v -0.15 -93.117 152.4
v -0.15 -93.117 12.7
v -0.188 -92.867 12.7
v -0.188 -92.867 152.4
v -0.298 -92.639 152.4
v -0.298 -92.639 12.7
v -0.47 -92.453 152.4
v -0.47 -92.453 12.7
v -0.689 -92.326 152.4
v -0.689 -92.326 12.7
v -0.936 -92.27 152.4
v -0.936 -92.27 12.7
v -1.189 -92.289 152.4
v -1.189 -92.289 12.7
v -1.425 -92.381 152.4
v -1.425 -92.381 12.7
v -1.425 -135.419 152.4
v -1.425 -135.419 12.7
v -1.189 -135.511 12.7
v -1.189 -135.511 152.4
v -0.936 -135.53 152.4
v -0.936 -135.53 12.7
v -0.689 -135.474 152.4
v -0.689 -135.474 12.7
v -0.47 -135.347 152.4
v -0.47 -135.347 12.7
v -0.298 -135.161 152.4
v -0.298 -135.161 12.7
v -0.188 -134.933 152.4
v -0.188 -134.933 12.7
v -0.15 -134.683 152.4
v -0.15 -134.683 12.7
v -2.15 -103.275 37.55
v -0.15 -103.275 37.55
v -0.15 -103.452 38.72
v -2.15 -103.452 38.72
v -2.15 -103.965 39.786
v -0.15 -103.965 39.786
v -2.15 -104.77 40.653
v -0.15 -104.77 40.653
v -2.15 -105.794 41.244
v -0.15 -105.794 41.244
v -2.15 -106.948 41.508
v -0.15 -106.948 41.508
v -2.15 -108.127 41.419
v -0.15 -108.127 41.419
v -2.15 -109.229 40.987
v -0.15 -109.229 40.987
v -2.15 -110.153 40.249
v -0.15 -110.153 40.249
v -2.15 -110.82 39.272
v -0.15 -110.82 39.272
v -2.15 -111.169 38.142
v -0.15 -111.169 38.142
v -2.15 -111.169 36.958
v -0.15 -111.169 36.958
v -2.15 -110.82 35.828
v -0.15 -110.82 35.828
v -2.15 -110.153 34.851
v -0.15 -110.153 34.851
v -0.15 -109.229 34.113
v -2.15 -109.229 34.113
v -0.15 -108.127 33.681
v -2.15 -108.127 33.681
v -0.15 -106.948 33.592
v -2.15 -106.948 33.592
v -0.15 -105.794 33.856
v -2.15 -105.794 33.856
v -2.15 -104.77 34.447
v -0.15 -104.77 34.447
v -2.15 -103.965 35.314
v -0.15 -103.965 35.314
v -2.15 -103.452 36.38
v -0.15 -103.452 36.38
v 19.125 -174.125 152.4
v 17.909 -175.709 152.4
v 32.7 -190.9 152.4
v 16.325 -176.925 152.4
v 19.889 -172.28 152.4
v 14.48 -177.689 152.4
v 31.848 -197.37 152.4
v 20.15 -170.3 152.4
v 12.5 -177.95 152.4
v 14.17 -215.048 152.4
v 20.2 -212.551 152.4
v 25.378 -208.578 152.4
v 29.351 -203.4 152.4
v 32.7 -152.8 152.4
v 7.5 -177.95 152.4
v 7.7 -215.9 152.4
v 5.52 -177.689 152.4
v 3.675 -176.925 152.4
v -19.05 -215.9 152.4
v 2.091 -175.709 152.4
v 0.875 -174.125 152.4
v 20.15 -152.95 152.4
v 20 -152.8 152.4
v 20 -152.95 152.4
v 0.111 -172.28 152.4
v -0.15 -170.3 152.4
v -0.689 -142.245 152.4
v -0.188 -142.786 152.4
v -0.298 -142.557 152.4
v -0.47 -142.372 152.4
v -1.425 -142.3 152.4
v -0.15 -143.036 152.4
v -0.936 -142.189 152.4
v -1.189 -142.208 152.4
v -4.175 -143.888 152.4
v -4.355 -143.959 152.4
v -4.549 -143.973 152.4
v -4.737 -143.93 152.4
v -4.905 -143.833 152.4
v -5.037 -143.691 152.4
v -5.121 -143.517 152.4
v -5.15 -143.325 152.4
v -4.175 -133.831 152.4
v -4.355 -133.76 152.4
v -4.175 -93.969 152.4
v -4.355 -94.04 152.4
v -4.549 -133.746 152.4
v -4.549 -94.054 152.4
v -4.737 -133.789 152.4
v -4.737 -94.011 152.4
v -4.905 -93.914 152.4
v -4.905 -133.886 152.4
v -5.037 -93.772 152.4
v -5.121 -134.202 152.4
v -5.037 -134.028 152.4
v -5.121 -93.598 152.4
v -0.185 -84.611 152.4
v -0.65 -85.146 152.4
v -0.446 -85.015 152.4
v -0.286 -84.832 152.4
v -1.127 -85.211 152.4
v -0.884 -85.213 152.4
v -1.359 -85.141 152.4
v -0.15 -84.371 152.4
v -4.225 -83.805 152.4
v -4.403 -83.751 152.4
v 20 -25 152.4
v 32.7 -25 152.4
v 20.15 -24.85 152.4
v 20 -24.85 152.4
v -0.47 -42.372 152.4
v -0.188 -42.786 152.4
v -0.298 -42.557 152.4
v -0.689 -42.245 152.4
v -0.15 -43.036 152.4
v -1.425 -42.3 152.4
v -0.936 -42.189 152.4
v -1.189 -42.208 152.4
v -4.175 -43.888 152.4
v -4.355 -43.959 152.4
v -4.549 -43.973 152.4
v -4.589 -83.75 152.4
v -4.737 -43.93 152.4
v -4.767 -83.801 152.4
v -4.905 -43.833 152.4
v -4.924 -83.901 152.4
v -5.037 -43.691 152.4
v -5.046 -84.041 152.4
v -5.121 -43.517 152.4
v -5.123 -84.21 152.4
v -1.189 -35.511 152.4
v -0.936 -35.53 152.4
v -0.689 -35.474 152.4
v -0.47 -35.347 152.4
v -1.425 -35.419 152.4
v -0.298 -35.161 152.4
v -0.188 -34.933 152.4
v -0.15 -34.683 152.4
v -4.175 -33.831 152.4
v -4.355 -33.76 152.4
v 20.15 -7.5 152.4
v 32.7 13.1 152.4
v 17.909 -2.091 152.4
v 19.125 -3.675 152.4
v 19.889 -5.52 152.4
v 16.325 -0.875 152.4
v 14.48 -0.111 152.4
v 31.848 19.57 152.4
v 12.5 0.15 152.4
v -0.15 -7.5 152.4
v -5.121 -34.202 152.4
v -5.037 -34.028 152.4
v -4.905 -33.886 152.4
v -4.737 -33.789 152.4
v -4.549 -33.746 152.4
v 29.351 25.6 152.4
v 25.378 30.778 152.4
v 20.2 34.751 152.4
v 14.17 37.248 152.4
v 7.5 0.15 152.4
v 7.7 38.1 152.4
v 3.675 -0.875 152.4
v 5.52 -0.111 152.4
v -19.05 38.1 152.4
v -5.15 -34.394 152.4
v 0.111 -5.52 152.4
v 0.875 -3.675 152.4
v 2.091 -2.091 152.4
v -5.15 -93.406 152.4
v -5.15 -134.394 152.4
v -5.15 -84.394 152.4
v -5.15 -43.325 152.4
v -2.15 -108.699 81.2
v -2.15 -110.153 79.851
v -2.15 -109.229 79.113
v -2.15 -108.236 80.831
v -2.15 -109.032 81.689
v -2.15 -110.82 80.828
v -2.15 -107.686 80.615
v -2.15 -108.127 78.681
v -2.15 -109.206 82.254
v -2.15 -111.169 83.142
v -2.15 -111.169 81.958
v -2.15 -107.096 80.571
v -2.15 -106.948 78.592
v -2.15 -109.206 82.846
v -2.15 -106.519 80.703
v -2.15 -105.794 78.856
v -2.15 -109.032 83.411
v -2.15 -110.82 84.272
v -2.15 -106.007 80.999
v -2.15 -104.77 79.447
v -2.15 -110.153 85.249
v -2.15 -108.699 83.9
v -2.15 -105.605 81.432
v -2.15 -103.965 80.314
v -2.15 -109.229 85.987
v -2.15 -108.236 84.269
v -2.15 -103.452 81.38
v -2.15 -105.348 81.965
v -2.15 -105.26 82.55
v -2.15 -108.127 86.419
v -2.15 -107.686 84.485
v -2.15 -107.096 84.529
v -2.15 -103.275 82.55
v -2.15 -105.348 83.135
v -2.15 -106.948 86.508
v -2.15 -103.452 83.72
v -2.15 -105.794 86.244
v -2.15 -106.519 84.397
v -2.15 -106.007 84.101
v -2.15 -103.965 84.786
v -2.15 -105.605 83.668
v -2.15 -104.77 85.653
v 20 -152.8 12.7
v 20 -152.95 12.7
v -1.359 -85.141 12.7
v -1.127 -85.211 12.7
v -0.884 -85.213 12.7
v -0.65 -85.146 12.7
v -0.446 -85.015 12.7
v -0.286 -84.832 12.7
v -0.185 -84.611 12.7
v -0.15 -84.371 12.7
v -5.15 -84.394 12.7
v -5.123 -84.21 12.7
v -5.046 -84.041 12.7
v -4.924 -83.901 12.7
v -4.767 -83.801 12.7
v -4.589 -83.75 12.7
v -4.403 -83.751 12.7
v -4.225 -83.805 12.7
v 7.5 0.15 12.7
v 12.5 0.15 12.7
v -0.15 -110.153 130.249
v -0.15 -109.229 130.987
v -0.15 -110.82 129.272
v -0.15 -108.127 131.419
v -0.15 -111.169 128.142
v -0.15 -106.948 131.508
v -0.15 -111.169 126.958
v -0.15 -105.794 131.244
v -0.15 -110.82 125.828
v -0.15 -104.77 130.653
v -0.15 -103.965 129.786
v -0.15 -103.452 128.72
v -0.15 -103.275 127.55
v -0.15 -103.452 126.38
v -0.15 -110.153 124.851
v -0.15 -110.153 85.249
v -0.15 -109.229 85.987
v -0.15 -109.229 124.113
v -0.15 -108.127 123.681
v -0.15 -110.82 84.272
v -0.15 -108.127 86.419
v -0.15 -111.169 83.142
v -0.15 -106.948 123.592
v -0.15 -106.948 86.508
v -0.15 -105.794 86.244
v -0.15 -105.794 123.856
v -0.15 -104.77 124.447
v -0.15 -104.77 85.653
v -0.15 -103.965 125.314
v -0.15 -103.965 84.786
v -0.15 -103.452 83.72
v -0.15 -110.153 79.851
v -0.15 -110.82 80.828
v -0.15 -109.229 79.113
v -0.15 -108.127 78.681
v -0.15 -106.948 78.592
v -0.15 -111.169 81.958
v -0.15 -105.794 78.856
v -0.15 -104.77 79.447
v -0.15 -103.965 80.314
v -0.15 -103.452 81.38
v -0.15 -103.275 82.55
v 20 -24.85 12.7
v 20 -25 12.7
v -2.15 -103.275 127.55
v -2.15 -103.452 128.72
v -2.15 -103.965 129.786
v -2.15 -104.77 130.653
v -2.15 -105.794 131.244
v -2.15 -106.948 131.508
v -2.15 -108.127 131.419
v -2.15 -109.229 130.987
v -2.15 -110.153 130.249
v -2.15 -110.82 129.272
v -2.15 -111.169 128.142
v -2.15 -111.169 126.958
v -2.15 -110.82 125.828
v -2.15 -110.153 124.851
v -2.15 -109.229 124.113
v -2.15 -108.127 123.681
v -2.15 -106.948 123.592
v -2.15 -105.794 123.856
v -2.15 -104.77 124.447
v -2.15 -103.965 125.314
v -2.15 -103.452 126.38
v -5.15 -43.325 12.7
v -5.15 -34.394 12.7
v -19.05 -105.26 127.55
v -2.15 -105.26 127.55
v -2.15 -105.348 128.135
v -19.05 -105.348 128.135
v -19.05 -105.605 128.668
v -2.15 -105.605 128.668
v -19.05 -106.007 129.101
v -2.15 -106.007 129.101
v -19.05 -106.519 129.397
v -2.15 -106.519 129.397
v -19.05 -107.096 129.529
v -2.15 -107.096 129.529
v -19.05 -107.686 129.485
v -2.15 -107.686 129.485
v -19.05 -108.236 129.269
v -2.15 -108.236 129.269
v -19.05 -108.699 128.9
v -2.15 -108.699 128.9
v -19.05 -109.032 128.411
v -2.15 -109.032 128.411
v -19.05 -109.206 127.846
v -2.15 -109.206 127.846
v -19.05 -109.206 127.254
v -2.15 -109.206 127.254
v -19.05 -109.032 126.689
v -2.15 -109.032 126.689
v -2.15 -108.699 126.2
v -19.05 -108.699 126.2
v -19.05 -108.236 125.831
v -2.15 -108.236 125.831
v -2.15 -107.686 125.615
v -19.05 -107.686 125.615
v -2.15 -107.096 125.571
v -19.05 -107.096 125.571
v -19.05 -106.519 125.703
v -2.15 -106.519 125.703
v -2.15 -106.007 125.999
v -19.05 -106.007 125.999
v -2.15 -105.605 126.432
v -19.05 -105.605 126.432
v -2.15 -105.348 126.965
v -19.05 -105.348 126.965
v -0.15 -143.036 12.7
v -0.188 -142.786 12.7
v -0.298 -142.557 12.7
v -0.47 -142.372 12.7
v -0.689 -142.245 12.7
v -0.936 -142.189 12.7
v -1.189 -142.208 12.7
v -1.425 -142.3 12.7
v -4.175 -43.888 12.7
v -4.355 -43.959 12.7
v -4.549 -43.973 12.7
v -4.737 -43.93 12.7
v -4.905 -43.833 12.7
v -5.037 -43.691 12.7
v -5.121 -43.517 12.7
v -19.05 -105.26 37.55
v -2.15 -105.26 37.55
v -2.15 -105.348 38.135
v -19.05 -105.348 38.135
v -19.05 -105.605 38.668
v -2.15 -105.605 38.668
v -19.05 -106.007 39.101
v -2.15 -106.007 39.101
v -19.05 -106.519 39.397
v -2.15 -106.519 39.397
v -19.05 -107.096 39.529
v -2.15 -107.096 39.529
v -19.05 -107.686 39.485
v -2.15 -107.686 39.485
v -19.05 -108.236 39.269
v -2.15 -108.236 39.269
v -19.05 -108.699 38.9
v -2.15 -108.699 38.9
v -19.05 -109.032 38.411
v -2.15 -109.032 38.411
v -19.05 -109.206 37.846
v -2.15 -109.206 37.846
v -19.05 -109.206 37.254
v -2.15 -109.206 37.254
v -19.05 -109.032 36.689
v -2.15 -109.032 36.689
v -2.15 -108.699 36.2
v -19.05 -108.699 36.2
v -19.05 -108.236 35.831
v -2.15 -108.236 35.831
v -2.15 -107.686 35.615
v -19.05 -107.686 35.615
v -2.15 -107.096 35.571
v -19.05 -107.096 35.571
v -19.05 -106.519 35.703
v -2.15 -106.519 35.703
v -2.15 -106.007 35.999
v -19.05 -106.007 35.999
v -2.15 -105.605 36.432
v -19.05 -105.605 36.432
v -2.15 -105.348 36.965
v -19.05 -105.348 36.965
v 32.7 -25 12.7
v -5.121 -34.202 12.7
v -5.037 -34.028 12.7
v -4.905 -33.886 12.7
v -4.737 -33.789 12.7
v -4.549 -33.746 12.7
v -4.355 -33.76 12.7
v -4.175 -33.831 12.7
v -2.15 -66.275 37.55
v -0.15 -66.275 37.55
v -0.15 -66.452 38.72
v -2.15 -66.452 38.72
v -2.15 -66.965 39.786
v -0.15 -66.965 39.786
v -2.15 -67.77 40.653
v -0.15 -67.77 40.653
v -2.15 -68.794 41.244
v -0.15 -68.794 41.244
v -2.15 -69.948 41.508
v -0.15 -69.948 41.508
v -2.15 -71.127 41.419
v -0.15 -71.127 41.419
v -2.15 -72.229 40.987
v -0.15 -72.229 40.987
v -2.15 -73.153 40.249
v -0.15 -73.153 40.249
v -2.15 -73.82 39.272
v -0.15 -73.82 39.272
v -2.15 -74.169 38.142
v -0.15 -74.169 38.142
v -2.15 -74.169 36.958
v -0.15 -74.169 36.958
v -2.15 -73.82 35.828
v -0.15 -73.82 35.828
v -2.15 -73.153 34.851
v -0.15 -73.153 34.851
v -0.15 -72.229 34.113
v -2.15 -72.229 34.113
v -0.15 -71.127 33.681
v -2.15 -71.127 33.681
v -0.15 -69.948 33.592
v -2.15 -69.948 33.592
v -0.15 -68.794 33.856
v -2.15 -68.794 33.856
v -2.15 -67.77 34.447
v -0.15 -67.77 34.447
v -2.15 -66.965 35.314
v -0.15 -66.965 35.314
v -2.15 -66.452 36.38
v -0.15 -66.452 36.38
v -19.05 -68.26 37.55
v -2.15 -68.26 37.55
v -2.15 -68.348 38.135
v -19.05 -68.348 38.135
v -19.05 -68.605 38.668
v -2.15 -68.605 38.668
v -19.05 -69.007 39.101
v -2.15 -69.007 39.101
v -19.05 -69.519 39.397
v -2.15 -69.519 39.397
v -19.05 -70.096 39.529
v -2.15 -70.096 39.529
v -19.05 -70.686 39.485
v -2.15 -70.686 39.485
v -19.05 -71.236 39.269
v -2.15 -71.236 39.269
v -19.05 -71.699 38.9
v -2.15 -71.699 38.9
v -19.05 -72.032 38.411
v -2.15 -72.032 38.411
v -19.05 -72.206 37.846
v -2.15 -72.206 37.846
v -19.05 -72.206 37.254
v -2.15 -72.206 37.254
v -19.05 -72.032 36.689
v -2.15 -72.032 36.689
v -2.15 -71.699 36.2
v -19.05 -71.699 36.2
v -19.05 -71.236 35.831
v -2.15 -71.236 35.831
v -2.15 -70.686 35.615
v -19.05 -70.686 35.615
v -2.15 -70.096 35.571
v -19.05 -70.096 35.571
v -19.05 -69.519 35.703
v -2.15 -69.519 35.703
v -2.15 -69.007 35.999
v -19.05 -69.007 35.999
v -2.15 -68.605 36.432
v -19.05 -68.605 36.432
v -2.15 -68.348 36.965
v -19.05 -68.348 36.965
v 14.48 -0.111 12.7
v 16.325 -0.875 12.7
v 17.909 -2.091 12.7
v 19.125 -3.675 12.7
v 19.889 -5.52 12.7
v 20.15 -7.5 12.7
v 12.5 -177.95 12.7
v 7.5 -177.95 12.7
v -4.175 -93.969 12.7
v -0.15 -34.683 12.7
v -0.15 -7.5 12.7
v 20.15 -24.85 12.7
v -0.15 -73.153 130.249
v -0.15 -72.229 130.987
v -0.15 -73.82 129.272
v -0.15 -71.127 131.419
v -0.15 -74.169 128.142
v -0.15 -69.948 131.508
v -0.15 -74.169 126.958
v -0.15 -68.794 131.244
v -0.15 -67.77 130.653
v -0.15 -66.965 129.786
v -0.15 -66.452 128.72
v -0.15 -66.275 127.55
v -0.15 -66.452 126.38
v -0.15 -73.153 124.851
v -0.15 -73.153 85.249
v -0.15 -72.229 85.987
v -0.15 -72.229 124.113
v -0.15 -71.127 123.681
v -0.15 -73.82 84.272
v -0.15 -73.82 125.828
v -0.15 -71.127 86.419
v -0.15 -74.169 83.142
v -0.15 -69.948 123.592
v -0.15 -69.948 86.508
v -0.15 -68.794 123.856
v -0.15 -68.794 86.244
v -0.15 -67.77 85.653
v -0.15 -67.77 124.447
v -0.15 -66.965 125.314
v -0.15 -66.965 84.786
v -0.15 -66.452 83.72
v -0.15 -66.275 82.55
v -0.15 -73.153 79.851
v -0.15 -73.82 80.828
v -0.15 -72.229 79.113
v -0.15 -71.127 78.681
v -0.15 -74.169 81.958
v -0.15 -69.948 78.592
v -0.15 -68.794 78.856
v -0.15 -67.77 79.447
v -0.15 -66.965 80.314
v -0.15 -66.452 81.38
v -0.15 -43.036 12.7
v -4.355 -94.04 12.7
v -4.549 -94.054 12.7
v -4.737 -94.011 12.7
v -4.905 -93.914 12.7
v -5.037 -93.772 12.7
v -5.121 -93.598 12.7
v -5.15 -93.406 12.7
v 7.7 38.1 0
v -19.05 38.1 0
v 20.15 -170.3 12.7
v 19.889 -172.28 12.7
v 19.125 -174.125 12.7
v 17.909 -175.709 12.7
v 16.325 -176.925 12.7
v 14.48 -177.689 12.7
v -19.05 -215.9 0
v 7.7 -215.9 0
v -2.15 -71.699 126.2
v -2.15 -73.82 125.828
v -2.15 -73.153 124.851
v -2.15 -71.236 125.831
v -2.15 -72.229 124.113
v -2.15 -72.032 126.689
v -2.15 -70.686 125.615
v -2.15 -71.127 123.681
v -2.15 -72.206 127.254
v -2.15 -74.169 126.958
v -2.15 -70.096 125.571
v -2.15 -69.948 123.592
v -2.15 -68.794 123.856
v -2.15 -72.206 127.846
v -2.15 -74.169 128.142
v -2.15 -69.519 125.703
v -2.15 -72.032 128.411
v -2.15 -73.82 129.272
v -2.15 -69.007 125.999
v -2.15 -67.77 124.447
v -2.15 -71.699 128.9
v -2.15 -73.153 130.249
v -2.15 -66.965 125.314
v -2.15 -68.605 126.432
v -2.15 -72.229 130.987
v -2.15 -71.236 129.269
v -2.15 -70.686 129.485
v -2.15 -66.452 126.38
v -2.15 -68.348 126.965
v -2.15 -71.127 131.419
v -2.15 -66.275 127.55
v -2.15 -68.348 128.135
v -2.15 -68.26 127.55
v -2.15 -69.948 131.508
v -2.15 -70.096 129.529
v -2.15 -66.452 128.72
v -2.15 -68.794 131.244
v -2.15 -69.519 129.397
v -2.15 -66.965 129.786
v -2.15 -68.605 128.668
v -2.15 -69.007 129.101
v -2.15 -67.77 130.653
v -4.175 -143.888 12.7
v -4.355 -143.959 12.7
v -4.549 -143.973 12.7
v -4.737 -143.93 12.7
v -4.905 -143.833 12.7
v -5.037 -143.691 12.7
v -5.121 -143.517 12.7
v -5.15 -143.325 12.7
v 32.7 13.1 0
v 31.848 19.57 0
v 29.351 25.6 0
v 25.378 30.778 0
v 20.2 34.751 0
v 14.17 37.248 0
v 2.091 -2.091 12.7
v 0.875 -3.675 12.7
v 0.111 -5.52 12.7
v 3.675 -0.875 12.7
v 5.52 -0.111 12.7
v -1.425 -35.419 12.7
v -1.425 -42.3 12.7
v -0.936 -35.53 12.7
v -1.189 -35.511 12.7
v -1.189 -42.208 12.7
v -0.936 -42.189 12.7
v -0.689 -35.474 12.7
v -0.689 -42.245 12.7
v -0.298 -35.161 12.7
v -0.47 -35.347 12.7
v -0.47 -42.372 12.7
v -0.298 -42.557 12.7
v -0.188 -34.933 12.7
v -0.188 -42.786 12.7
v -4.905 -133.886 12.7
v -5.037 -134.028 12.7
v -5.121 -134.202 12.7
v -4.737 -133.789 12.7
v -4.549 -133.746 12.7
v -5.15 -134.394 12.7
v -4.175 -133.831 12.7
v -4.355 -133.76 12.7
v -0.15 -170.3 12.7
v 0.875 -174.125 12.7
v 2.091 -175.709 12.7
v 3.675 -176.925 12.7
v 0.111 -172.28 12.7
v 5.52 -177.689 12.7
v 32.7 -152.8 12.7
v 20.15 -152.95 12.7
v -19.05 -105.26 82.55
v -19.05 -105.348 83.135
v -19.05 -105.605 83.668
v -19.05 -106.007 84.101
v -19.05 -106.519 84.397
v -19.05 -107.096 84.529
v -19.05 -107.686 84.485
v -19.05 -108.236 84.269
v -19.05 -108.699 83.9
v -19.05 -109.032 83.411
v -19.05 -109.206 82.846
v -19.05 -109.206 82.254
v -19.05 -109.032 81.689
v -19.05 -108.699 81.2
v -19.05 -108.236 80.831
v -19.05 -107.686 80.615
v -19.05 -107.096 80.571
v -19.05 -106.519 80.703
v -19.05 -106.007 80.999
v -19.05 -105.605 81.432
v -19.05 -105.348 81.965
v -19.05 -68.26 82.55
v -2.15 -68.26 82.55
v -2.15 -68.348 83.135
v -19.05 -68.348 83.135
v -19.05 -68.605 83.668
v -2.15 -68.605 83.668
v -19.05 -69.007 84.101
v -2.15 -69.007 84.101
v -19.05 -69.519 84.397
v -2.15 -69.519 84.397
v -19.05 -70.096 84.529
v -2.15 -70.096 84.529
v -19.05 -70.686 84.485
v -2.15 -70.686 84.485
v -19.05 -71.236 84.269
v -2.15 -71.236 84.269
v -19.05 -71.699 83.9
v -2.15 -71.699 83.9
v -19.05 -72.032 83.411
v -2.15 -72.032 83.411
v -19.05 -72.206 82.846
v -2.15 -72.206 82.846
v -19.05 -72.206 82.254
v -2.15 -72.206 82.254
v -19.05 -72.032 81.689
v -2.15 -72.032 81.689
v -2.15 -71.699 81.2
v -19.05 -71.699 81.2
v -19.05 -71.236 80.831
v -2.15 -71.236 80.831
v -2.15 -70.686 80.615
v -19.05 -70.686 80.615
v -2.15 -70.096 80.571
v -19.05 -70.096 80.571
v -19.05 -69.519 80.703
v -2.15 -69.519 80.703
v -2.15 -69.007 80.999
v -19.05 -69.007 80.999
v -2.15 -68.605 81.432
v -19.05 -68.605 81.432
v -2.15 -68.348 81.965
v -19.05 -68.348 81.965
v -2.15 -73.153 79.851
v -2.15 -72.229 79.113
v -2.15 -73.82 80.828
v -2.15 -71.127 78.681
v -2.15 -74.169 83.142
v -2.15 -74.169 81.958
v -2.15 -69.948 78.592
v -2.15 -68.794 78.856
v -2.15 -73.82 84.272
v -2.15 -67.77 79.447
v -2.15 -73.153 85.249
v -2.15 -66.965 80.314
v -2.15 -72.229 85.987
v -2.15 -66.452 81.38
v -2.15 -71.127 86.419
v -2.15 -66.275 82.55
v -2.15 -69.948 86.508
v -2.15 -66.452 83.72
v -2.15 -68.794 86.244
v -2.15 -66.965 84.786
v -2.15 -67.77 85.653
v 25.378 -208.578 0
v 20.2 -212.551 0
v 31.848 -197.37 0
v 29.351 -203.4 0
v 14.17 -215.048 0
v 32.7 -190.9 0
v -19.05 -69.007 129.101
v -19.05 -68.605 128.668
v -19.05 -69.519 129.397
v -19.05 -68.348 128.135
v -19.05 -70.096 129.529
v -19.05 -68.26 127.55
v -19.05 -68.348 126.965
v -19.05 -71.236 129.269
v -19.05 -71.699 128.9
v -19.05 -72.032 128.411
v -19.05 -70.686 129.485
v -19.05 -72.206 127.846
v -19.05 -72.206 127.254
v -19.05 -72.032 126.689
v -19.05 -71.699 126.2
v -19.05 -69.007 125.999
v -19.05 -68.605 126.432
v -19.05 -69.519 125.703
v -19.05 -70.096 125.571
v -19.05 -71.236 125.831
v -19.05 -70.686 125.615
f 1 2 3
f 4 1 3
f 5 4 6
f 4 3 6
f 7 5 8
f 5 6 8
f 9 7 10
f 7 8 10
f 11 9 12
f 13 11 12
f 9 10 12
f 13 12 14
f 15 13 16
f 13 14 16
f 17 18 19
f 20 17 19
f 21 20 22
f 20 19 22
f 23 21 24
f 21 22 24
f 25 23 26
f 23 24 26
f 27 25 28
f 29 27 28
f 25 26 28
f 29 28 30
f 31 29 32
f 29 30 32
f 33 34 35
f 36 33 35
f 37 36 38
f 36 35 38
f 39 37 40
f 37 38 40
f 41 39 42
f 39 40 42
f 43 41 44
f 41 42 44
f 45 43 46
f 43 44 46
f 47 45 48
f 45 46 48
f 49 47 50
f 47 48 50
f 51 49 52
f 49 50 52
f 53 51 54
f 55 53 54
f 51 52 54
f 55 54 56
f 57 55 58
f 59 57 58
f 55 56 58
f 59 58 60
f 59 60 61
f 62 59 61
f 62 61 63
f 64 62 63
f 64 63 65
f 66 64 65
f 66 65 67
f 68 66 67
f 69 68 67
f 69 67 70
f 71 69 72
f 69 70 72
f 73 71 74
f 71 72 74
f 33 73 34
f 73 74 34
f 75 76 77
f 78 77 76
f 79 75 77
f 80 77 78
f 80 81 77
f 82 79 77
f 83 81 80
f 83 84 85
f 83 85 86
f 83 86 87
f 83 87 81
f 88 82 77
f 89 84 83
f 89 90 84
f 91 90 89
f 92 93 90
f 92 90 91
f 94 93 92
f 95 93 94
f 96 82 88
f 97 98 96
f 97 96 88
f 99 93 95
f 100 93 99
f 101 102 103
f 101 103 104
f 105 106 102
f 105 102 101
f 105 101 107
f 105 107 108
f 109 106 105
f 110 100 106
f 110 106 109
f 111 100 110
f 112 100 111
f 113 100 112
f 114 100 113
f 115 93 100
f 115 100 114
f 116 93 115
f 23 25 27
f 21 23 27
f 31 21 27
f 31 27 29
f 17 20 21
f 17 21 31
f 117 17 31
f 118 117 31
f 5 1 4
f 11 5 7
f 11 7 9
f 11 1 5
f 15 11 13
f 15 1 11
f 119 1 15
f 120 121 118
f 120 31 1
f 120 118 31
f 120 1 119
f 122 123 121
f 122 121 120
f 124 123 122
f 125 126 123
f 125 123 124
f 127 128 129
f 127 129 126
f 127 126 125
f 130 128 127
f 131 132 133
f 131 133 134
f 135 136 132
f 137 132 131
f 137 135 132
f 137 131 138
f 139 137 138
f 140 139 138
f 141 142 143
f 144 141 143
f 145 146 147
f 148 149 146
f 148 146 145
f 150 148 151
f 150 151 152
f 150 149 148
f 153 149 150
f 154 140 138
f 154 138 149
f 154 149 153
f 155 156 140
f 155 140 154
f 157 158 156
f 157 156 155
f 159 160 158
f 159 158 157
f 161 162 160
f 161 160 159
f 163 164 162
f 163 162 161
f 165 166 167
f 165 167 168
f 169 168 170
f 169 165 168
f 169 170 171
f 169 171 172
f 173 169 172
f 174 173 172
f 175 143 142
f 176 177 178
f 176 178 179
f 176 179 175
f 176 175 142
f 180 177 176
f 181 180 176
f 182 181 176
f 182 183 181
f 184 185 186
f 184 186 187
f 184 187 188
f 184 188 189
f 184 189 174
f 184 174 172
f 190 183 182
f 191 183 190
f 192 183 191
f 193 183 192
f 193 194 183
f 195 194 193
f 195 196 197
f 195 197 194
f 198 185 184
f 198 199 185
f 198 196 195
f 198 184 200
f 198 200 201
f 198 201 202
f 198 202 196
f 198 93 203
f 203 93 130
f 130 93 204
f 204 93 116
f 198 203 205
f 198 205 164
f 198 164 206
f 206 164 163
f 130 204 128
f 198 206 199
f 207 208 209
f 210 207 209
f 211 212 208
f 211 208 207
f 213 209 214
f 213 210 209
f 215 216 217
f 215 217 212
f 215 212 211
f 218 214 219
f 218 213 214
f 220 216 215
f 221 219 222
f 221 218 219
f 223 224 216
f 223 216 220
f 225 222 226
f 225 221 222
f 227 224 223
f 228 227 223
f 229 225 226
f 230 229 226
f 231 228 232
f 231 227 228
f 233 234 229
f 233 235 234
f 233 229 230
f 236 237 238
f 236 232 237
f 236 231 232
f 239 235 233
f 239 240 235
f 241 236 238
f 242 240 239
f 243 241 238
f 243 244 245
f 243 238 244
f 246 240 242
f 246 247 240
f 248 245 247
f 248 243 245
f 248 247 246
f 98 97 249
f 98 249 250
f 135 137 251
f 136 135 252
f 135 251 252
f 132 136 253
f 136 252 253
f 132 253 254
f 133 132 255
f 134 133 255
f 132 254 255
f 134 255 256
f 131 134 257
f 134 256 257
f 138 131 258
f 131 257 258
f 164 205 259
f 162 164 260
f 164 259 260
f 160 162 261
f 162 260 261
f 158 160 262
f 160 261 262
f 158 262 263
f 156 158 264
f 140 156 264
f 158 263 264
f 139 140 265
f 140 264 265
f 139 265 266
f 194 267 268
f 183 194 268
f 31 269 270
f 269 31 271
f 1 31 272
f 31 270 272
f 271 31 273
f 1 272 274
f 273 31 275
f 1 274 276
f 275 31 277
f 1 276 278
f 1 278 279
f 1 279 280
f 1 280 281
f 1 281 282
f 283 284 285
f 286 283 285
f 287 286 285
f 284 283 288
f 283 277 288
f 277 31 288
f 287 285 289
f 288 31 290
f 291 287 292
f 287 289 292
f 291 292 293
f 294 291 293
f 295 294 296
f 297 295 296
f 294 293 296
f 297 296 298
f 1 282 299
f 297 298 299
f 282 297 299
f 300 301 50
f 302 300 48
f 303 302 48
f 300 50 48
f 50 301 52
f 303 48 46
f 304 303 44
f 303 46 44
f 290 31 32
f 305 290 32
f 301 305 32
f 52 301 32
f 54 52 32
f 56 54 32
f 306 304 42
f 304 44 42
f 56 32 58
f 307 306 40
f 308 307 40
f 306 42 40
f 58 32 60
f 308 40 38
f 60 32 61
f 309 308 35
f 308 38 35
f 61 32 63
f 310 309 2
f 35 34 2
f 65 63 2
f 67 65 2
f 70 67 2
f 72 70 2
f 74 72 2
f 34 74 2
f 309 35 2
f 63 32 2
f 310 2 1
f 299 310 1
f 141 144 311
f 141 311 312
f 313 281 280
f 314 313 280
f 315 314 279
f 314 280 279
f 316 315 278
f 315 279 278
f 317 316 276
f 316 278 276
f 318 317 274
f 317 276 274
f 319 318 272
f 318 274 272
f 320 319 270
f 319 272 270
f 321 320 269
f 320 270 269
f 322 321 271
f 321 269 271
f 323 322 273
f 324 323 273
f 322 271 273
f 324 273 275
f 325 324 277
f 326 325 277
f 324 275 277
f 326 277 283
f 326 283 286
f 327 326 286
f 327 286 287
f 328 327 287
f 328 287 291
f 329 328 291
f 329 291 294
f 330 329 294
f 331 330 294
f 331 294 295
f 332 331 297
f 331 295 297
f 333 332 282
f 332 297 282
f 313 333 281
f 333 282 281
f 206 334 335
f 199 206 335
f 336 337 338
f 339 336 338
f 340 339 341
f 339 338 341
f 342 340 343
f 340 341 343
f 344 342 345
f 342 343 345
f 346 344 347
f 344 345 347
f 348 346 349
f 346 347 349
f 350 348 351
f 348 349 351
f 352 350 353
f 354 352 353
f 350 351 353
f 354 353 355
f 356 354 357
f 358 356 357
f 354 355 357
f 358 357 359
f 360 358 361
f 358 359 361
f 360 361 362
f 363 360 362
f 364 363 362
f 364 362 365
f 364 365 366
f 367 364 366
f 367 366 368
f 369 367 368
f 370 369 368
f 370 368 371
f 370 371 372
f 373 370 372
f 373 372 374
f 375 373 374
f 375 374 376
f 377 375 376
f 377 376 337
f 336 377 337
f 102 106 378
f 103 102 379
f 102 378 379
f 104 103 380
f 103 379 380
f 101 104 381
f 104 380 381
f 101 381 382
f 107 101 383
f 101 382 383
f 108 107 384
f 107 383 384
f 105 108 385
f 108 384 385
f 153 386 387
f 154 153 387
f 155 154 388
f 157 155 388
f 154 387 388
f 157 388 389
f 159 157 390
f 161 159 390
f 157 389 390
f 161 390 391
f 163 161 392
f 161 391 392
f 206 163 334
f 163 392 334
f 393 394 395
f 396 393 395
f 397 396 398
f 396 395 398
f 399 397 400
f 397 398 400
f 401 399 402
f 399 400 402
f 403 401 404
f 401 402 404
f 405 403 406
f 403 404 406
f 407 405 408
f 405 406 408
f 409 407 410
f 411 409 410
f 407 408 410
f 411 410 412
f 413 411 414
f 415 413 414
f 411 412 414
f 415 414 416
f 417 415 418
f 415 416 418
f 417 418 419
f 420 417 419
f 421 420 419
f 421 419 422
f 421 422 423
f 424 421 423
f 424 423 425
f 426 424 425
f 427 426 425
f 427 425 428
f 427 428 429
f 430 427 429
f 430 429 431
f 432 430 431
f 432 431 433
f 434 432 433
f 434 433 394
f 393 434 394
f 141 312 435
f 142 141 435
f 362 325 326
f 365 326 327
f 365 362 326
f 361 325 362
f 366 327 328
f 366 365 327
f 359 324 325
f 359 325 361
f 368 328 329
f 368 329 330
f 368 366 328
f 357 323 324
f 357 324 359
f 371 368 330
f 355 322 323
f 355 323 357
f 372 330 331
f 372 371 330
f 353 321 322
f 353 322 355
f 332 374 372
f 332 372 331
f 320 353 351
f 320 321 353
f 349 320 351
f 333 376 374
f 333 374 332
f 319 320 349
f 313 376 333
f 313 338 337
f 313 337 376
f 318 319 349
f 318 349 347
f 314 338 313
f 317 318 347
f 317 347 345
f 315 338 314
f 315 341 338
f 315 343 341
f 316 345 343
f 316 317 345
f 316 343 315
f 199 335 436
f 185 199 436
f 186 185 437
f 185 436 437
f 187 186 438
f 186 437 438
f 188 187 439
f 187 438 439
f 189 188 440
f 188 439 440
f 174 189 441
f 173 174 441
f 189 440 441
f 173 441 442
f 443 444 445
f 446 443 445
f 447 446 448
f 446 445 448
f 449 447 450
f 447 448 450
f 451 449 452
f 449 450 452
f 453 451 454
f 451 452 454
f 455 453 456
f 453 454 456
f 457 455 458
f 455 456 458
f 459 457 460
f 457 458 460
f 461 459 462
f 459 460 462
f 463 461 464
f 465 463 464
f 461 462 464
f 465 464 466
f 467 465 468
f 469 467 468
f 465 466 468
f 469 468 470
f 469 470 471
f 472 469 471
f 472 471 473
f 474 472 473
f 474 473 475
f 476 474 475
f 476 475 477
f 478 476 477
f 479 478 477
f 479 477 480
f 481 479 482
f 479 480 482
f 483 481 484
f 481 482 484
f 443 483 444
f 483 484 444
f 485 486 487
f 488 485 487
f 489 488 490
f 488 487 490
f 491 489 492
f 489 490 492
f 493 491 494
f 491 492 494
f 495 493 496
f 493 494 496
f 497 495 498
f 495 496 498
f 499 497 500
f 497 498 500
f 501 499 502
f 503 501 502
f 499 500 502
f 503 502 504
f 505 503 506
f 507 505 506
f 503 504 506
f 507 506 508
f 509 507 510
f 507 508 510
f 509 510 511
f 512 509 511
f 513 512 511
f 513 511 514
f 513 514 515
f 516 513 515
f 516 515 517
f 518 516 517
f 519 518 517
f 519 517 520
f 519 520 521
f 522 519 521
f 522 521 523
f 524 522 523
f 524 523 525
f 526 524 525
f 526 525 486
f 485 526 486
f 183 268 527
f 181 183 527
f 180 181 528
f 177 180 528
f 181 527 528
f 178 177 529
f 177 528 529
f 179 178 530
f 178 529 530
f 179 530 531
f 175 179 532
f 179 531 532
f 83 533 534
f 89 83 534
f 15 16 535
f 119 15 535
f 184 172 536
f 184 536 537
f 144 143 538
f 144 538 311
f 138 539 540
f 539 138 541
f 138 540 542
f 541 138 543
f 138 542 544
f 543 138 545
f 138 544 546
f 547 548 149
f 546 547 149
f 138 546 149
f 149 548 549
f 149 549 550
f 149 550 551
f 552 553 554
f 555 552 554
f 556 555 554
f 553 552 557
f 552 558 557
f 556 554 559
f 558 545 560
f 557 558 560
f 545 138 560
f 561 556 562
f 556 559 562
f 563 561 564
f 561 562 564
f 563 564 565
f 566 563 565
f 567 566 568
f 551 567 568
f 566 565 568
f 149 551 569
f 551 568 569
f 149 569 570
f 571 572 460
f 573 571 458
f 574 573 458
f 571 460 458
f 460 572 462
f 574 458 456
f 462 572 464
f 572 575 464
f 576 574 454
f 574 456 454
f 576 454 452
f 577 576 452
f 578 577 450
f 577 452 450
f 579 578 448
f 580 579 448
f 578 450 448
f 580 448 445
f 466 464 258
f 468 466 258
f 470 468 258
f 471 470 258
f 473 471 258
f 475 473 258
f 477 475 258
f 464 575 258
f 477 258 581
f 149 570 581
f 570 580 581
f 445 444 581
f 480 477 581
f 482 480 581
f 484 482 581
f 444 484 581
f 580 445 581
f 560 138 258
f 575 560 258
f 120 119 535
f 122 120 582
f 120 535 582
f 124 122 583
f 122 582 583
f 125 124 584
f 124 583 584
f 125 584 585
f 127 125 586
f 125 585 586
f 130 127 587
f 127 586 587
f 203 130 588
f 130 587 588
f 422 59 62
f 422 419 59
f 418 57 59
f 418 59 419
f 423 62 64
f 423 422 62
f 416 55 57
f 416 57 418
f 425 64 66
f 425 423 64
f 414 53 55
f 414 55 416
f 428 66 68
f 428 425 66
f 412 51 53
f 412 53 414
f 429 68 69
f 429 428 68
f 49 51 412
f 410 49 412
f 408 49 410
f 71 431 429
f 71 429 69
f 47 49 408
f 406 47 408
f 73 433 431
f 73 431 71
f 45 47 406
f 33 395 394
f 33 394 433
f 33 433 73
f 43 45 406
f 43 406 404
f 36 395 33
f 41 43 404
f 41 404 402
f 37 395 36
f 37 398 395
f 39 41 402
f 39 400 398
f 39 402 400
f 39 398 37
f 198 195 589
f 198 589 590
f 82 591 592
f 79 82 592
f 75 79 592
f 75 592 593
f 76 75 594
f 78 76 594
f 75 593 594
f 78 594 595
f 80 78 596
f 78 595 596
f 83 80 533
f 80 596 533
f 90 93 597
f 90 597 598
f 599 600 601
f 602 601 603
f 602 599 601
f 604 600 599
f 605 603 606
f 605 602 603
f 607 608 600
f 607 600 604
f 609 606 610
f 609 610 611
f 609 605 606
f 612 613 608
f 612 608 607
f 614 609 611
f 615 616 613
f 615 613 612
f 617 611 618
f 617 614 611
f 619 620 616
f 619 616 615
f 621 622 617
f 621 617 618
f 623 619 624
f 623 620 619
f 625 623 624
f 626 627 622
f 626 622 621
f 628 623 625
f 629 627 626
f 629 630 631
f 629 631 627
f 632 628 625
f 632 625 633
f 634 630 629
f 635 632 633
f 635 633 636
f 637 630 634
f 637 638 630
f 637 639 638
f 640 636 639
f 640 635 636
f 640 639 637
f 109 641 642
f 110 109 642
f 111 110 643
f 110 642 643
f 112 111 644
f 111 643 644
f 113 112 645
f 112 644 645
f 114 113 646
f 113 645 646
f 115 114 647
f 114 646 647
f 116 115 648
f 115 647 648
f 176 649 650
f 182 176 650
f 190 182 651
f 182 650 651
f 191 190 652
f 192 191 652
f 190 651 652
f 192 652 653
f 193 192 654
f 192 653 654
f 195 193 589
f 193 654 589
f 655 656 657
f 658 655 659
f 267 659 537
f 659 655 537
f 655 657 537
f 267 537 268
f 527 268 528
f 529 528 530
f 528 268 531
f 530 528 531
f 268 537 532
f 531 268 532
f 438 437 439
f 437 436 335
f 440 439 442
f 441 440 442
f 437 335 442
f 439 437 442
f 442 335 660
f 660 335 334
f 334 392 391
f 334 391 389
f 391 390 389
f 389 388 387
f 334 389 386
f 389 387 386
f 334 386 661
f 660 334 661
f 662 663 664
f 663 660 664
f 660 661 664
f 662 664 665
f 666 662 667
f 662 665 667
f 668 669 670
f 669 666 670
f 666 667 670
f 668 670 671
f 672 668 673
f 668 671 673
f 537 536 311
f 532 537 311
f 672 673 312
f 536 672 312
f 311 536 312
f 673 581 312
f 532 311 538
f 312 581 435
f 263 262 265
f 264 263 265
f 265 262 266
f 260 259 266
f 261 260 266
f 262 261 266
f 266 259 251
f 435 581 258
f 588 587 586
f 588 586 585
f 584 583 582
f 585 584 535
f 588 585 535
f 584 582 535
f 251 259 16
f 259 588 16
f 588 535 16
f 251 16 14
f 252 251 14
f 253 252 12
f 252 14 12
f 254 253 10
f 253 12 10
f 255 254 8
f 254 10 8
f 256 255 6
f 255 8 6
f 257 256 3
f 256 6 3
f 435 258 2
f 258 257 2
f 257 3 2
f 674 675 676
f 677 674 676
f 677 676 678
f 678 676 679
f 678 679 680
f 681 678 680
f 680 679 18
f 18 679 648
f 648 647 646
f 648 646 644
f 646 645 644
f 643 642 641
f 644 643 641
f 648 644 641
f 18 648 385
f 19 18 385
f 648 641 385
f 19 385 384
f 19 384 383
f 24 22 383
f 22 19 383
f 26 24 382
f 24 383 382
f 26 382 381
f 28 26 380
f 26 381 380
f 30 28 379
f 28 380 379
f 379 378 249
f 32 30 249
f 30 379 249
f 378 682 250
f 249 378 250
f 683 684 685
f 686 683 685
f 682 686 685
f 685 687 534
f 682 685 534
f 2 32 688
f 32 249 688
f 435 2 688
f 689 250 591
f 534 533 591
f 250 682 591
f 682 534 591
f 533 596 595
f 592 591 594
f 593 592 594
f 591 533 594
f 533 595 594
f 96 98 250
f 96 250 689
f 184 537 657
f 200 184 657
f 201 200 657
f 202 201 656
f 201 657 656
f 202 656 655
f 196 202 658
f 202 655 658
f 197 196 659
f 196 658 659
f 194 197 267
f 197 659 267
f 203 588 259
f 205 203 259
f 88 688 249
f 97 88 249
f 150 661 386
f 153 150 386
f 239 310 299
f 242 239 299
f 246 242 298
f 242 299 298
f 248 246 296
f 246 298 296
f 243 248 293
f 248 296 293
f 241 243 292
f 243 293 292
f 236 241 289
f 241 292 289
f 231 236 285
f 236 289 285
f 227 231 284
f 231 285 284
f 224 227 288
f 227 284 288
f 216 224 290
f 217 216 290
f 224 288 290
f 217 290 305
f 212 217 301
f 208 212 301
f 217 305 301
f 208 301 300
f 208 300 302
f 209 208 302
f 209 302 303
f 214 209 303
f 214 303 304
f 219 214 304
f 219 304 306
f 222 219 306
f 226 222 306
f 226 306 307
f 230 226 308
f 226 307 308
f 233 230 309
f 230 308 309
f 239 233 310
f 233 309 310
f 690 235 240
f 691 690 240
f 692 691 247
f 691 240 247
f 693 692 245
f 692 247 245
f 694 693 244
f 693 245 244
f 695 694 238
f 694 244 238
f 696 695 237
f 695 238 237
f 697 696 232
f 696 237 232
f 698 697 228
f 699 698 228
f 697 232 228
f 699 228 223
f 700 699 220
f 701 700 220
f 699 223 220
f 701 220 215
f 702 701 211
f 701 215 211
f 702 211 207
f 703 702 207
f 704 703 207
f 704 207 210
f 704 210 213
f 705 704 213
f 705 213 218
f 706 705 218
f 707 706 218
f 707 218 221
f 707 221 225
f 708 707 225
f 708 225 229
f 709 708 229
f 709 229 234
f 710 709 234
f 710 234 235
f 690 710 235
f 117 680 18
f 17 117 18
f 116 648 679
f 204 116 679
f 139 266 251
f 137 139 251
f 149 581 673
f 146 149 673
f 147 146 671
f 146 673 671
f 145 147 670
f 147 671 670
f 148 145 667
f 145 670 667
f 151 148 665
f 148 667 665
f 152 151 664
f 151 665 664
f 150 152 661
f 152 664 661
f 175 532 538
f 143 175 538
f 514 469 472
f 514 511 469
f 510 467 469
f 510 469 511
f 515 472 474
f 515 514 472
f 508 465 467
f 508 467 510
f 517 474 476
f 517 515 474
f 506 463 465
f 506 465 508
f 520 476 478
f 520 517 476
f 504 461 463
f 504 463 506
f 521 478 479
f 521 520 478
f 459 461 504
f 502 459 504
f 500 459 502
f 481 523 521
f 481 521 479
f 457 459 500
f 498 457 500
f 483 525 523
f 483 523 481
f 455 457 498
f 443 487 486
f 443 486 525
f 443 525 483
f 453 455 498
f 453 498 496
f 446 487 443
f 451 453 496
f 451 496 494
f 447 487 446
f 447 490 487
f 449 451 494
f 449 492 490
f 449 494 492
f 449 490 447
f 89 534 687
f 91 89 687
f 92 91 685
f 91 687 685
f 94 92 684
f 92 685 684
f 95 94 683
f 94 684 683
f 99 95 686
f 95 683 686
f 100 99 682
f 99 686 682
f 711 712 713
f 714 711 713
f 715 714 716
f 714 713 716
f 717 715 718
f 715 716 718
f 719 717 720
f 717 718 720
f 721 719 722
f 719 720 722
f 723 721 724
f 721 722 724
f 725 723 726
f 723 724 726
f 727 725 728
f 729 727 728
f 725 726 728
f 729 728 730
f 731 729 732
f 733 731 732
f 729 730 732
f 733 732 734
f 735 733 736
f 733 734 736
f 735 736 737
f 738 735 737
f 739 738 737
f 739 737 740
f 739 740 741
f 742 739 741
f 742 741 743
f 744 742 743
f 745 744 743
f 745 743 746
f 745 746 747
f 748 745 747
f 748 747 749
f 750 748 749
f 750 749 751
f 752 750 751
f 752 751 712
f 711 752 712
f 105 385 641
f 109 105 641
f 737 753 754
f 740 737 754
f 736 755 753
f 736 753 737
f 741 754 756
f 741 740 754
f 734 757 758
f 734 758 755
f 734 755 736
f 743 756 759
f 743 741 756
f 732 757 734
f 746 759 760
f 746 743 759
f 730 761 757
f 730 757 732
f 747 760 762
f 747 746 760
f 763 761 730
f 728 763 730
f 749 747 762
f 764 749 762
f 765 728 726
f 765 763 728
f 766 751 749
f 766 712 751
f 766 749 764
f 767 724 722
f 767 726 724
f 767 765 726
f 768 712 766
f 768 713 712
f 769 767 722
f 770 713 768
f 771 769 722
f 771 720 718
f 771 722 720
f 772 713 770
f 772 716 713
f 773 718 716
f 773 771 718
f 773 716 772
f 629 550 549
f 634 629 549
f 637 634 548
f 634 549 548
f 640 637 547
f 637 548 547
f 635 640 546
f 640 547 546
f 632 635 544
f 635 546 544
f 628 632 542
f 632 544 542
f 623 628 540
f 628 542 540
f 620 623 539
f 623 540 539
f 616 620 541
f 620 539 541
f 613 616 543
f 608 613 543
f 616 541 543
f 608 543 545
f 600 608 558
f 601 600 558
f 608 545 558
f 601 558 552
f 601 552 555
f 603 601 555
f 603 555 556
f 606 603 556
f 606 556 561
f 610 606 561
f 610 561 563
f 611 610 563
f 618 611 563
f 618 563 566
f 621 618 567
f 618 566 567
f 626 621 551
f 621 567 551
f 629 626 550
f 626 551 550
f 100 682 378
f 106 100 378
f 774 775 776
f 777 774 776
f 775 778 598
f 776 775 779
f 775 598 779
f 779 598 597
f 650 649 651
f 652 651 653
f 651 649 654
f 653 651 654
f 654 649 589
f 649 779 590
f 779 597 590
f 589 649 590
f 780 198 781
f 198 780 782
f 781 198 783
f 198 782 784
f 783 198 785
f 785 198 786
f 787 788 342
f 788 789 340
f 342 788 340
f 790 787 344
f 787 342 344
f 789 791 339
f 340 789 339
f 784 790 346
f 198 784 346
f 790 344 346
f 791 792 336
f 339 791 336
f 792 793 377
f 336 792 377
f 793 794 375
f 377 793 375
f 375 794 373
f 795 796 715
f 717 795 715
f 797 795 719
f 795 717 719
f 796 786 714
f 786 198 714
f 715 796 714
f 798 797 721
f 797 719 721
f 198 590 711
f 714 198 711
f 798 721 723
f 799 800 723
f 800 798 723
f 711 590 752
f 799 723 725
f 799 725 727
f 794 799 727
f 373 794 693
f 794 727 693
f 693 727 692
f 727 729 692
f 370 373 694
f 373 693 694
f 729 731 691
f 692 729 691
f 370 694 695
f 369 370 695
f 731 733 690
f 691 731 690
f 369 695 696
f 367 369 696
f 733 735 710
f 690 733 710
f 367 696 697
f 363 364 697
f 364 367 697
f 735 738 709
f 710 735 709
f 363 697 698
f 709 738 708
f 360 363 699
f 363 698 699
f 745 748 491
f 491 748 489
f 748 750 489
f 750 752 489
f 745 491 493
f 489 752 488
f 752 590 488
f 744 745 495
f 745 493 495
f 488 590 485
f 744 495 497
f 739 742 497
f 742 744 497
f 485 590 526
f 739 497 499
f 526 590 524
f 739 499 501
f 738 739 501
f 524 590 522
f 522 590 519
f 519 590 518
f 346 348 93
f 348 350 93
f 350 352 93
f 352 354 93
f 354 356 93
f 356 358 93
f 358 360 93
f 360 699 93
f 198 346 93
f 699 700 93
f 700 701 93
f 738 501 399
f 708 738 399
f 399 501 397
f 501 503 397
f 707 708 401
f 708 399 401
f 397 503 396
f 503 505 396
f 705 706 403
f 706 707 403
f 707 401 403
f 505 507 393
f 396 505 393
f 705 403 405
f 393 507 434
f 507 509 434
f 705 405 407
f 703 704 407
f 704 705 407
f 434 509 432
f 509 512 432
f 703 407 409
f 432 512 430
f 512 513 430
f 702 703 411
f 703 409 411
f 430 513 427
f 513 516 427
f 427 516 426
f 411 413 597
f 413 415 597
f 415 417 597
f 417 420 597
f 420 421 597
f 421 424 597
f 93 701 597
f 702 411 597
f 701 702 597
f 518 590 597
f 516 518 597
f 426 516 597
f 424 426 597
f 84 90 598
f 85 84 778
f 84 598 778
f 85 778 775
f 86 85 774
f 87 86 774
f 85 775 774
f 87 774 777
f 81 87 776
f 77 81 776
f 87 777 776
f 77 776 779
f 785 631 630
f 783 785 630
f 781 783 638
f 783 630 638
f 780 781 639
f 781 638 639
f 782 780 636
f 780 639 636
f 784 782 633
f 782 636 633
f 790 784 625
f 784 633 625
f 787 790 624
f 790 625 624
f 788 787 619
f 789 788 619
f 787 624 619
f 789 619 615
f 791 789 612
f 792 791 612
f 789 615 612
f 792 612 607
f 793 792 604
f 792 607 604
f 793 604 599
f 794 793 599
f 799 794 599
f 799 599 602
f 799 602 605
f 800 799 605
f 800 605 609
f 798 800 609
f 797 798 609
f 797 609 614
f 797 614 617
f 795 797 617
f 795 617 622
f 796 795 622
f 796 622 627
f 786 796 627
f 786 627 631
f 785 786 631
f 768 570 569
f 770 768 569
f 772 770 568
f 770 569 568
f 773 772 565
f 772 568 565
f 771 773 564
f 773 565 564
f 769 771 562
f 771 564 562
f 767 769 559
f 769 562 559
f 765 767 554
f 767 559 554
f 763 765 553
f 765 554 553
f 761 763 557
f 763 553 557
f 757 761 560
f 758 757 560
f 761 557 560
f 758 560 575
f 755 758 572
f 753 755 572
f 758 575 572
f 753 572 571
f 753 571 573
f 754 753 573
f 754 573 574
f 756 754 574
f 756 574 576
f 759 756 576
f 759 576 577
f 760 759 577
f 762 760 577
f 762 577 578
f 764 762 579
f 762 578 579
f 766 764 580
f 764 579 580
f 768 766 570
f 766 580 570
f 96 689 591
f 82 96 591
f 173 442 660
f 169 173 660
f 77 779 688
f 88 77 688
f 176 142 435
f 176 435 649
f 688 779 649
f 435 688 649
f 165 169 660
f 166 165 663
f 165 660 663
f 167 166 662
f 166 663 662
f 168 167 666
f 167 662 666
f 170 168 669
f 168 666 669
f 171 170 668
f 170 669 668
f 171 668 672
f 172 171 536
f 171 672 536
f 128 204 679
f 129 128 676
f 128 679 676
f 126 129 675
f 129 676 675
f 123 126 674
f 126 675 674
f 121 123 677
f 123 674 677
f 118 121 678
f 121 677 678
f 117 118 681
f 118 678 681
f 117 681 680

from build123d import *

# Parameters (mm, degrees)
BOSS_EXTRUDE1_DEPTH = 152.4
BOSS_EXTRUDE2_DEPTH = 12.7
SKETCH3_R           = 1.984375
CUT_EXTRUDE1_DEPTH  = 25
SKETCH4_R           = 3.96875
CUT_EXTRUDE2_DEPTH  = 2


with BuildPart() as part:
    # Sketch1 → Boss-Extrude1 (new body)
    with BuildSketch(Plane(origin=(0, 0, 0), x_dir=(0, 1, 0), z_dir=(0, 0, 1))):
        with BuildLine():
            Line((-93.406104195, 5.15), (-84.393895805, 5.15))
            ThreePointArc((-84.393895805, 5.15), (-83.845691366, 4.849244745), (-83.804795744, 4.22529813))
            Line((-83.804795744, 4.22529813), (-85.141267349, 1.359225522))
            ThreePointArc((-85.141267349, 1.359225522), (-85.087788459, 0.543295333), (-84.37090573, 0.15))
            Line((-84.37090573, 0.15), (-43.036246445, 0.15))
            ThreePointArc((-43.036246445, 0.15), (-42.300124852, 0.575), (-42.300124852, 1.425))
            Line((-42.300124852, 1.425), (-43.887838092, 4.175))
            ThreePointArc((-43.887838092, 4.175), (-43.887838092, 4.825), (-43.324921579, 5.15))
            Line((-43.324921579, 5.15), (-34.393895805, 5.15))
            ThreePointArc((-34.393895805, 5.15), (-33.830979293, 4.825), (-33.830979293, 4.175))
            Line((-33.830979293, 4.175), (-35.418692533, 1.425))
            ThreePointArc((-35.418692533, 1.425), (-35.418692533, 0.575), (-34.68257094, 0.15))
            Line((-34.68257094, 0.15), (-7.5, 0.15))
            ThreePointArc((-7.5, 0.15), (-2.090633124, -2.090633124), (0.15, -7.5))
            Line((0.15, -7.5), (0.15, -12.5))
            ThreePointArc((0.15, -12.5), (-2.090633124, -17.909366876), (-7.5, -20.15))
            Line((-7.5, -20.15), (-24.85, -20.15))
            Line((-24.85, -20.15), (-24.85, -20))
            Line((-24.85, -20), (-25, -20))
            Line((-25, -20), (-25, -32.7))
            Line((-25, -32.7), (13.1, -32.7))
            ThreePointArc((13.1, -32.7), (30.77766953, -25.37766953), (38.1, -7.7))
            Line((38.1, -7.7), (38.1, 19.05))
            Line((38.1, 19.05), (-215.9, 19.05))
            Line((-215.9, 19.05), (-215.9, -7.7))
            ThreePointArc((-215.9, -7.7), (-208.57766953, -25.37766953), (-190.9, -32.7))
            Line((-190.9, -32.7), (-152.8, -32.7))
            Line((-152.8, -32.7), (-152.8, -20))
            Line((-152.8, -20), (-152.95, -20))
            Line((-152.95, -20), (-152.95, -20.15))
            Line((-152.95, -20.15), (-170.3, -20.15))
            ThreePointArc((-170.3, -20.15), (-175.709366876, -17.909366876), (-177.95, -12.5))
            Line((-177.95, -12.5), (-177.95, -7.5))
            ThreePointArc((-177.95, -7.5), (-175.709366876, -2.090633124), (-170.3, 0.15))
            Line((-170.3, 0.15), (-143.036246445, 0.15))
            ThreePointArc((-143.036246445, 0.15), (-142.300124852, 0.575), (-142.300124852, 1.425))
            Line((-142.300124852, 1.425), (-143.887838092, 4.175))
            ThreePointArc((-143.887838092, 4.175), (-143.887838092, 4.825), (-143.324921579, 5.15))
            Line((-143.324921579, 5.15), (-134.393895805, 5.15))
            ThreePointArc((-134.393895805, 5.15), (-133.830979293, 4.825), (-133.830979293, 4.175))
            Line((-133.830979293, 4.175), (-135.418692533, 1.425))
            ThreePointArc((-135.418692533, 1.425), (-135.418692533, 0.575), (-134.68257094, 0.15))
            Line((-134.68257094, 0.15), (-93.11742906, 0.15))
            ThreePointArc((-93.11742906, 0.15), (-92.381307467, 0.575), (-92.381307467, 1.425))
            Line((-92.381307467, 1.425), (-93.969020707, 4.175))
            ThreePointArc((-93.969020707, 4.175), (-93.969020707, 4.825), (-93.406104195, 5.15))
        make_face()
    extrude(amount=BOSS_EXTRUDE1_DEPTH)

    # Sketch2 → Boss-Extrude2 (add)
    with BuildSketch(Plane(origin=(0, 0, 0), x_dir=(1, 0, 0), z_dir=(0, 0, -1))):
        Polygon((-19.05, 215.9), (-19.05, -38.1), (7.7, -38.1), (32.7, 25), (32.7, 152.8), (32.7, 190.9), (7.7, 215.9), align=None)
    extrude(amount=-BOSS_EXTRUDE2_DEPTH)

    # Sketch3 → Cut-Extrude1 (cut)
    with BuildSketch(Plane.YZ.offset(-0.15)):
        with Locations((-107.244167395, 37.55)):
            Circle(SKETCH3_R)
        with Locations((-107.244167395, 82.55)):
            Circle(SKETCH3_R)
        with Locations((-107.244167395, 127.55)):
            Circle(SKETCH3_R)
        with Locations((-70.244167395, 37.55)):
            Circle(SKETCH3_R)
        with Locations((-70.244167395, 82.55)):
            Circle(SKETCH3_R)
        with Locations((-70.244167395, 127.55)):
            Circle(SKETCH3_R)
    extrude(amount=-CUT_EXTRUDE1_DEPTH, mode=Mode.SUBTRACT)

    # Sketch4 → Cut-Extrude2 (cut)
    with BuildSketch(Plane.YZ.offset(-0.15)):
        with Locations((-107.244167395, 127.55)):
            Circle(SKETCH4_R)
        with Locations((-107.244167395, 82.55)):
            Circle(SKETCH4_R)
        with Locations((-107.244167395, 37.55)):
            Circle(SKETCH4_R)
        with Locations((-70.244167395, 37.55)):
            Circle(SKETCH4_R)
        with Locations((-70.244167395, 82.55)):
            Circle(SKETCH4_R)
        with Locations((-70.244167395, 127.55)):
            Circle(SKETCH4_R)
    extrude(amount=-CUT_EXTRUDE2_DEPTH, mode=Mode.SUBTRACT)


solid = part.part
